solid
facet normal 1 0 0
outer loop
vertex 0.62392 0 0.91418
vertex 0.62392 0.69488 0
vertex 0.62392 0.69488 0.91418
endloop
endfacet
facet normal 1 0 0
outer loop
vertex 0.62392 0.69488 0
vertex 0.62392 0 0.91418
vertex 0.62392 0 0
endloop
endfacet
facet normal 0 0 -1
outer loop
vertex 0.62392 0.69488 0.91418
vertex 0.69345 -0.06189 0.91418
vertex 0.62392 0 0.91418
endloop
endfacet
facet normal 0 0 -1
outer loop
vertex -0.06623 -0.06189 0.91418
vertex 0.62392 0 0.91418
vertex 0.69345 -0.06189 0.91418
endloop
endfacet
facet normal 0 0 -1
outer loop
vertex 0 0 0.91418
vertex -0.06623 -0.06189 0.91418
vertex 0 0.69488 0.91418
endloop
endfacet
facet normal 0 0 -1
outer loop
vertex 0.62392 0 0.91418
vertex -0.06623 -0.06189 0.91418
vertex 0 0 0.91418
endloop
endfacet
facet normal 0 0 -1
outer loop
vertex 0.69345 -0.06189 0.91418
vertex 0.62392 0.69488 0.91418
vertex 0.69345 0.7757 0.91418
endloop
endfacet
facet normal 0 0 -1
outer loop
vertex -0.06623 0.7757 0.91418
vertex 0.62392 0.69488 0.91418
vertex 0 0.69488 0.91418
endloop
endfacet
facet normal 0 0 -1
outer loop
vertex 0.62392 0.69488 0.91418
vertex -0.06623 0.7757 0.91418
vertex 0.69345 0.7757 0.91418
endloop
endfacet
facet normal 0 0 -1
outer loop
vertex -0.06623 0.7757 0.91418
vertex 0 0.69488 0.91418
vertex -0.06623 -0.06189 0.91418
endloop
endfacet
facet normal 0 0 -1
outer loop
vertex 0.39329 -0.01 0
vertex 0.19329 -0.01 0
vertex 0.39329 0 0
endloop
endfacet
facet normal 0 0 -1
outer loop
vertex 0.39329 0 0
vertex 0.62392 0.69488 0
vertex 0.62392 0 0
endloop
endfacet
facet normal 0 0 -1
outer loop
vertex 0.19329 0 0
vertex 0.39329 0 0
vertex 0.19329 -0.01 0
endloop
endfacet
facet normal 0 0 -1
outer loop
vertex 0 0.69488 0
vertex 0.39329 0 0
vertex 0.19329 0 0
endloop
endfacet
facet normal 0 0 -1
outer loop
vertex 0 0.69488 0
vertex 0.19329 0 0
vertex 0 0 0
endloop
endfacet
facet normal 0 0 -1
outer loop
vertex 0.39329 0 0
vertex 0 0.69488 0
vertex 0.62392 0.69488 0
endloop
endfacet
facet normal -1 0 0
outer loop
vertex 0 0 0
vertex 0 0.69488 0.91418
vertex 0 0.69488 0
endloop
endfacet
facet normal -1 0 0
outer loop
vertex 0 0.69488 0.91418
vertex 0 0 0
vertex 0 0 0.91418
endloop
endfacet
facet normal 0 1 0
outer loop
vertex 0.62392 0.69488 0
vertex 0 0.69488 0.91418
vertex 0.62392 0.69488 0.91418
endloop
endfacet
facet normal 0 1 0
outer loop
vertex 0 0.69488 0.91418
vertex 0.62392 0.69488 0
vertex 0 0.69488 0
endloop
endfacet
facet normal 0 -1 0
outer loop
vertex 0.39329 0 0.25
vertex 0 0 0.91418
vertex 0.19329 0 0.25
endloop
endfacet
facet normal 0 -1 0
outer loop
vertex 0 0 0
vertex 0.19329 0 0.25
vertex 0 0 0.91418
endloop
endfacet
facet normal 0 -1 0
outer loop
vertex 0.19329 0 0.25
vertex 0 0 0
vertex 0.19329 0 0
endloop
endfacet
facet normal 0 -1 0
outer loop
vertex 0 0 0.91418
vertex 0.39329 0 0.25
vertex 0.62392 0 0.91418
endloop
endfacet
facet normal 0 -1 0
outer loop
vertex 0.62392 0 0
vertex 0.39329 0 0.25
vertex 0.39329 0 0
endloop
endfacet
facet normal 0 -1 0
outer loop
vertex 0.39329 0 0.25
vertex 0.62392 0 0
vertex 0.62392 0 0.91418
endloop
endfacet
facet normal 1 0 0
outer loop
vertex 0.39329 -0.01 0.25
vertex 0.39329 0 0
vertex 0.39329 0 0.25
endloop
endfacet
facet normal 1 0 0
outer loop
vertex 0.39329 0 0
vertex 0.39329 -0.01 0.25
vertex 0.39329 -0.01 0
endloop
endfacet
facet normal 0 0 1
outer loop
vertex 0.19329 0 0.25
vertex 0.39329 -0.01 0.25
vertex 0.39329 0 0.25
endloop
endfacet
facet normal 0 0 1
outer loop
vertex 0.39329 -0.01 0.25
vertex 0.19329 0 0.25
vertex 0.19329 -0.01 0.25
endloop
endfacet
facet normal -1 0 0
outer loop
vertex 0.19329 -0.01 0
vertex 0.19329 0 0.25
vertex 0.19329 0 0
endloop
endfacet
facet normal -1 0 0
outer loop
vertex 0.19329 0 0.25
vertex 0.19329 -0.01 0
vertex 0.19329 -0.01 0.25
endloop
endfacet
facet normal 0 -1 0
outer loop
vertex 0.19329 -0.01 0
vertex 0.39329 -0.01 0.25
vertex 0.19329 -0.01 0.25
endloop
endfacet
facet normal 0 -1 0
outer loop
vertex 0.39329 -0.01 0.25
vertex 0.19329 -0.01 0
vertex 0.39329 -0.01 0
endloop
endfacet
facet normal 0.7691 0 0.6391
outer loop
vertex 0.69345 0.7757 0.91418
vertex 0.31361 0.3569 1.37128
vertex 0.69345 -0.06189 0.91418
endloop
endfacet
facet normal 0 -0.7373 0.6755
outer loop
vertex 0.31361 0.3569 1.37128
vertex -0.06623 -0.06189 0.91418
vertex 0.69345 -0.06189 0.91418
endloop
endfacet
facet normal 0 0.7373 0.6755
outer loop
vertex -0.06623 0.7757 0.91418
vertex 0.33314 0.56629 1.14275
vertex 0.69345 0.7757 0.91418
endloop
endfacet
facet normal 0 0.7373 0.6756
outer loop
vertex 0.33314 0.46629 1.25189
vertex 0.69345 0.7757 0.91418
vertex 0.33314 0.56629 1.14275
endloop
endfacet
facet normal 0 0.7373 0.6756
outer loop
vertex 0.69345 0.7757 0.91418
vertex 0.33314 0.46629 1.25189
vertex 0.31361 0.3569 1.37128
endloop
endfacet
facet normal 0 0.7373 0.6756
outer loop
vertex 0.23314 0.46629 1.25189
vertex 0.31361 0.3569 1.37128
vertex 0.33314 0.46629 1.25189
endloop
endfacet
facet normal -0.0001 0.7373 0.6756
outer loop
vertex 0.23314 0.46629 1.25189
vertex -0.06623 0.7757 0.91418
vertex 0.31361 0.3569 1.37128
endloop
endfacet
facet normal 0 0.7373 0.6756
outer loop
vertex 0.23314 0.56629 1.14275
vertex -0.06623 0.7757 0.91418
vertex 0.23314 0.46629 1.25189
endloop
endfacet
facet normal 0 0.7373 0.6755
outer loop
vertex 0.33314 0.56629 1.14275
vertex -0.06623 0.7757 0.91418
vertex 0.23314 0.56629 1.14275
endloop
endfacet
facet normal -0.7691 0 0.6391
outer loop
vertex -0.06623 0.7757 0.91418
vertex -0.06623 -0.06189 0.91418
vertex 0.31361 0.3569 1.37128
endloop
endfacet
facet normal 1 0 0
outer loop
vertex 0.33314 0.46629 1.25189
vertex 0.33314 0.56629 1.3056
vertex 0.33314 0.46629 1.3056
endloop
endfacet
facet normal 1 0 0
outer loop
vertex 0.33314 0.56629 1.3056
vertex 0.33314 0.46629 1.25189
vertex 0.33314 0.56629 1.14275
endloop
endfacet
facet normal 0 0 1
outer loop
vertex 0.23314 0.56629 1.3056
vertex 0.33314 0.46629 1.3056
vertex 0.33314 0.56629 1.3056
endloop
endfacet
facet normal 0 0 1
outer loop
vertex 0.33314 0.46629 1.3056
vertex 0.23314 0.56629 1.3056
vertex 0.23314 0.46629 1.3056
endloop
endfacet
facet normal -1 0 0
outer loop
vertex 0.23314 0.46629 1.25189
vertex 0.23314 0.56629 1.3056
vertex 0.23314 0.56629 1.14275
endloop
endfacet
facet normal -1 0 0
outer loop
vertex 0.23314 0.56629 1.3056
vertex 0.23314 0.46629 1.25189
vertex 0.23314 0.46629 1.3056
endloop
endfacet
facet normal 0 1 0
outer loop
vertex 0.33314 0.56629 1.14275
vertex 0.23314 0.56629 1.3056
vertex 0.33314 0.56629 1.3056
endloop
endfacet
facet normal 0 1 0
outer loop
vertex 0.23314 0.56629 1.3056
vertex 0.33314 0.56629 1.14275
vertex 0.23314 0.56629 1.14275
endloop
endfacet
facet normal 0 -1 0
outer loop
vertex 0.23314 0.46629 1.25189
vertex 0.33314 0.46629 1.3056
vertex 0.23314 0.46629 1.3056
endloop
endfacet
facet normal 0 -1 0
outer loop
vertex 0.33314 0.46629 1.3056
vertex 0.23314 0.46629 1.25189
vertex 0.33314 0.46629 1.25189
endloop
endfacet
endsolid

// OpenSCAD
house_size = rands(0.5, 1, 3);
roof_overhang = rands(0.1, 0.3, 2);
door_width = 0.2;
door_height = 0.25;

window_size = 0.15;

// body
union() {
    cube(house_size);
    
    door_location = rands(0.1, house_size[0] - door_width - 0.1, 1)[0];

    translate([door_location, -0.01, 0])
        color("red")
            cube([door_width, 0.1, door_height]);
    
    door_empty_space_left = door_location;
    window_door_offset = window_size + 0.05;
    
    if (door_empty_space_left > window_door_offset + 0.01) {
        window_location = rands(0.1, door_empty_space_left - window_door_offset, 1)[0];

        translate([window_location, -0.01, door_height - window_size - 0.02])
            color("LightBlue")
                cube([window_size, 0.1, window_size]);
    }
}

// roof
union() {
    scale(concat(roof_overhang, [1]) + [1, 1, 0])
        translate(concat(roof_overhang, [0])*-0.25)
            scale(house_size*0.5)
                translate([1, 1, 2])
                    polyhedron(
                      points=[ [1,1,0],[1,-1,0],[-1,-1,0],[-1,1,0], // the four points at base
                               [0,0,1]  ],                                 // the apex point 
                      faces=[ [0,1,4],[1,2,4],[2,3,4],[3,0,4],              // each triangle side
                                  [1,0,3],[2,1,3] ]                         // two triangles for square base
                     );

    translate([rands(0.1, house_size[0] - 0.1, 1)[0], rands(0.1, house_size[1] - 0.1, 1)[0], house_size[2]*1.1])
        color("red")
            cube([0.1, 0.1, 0.3]);
}
